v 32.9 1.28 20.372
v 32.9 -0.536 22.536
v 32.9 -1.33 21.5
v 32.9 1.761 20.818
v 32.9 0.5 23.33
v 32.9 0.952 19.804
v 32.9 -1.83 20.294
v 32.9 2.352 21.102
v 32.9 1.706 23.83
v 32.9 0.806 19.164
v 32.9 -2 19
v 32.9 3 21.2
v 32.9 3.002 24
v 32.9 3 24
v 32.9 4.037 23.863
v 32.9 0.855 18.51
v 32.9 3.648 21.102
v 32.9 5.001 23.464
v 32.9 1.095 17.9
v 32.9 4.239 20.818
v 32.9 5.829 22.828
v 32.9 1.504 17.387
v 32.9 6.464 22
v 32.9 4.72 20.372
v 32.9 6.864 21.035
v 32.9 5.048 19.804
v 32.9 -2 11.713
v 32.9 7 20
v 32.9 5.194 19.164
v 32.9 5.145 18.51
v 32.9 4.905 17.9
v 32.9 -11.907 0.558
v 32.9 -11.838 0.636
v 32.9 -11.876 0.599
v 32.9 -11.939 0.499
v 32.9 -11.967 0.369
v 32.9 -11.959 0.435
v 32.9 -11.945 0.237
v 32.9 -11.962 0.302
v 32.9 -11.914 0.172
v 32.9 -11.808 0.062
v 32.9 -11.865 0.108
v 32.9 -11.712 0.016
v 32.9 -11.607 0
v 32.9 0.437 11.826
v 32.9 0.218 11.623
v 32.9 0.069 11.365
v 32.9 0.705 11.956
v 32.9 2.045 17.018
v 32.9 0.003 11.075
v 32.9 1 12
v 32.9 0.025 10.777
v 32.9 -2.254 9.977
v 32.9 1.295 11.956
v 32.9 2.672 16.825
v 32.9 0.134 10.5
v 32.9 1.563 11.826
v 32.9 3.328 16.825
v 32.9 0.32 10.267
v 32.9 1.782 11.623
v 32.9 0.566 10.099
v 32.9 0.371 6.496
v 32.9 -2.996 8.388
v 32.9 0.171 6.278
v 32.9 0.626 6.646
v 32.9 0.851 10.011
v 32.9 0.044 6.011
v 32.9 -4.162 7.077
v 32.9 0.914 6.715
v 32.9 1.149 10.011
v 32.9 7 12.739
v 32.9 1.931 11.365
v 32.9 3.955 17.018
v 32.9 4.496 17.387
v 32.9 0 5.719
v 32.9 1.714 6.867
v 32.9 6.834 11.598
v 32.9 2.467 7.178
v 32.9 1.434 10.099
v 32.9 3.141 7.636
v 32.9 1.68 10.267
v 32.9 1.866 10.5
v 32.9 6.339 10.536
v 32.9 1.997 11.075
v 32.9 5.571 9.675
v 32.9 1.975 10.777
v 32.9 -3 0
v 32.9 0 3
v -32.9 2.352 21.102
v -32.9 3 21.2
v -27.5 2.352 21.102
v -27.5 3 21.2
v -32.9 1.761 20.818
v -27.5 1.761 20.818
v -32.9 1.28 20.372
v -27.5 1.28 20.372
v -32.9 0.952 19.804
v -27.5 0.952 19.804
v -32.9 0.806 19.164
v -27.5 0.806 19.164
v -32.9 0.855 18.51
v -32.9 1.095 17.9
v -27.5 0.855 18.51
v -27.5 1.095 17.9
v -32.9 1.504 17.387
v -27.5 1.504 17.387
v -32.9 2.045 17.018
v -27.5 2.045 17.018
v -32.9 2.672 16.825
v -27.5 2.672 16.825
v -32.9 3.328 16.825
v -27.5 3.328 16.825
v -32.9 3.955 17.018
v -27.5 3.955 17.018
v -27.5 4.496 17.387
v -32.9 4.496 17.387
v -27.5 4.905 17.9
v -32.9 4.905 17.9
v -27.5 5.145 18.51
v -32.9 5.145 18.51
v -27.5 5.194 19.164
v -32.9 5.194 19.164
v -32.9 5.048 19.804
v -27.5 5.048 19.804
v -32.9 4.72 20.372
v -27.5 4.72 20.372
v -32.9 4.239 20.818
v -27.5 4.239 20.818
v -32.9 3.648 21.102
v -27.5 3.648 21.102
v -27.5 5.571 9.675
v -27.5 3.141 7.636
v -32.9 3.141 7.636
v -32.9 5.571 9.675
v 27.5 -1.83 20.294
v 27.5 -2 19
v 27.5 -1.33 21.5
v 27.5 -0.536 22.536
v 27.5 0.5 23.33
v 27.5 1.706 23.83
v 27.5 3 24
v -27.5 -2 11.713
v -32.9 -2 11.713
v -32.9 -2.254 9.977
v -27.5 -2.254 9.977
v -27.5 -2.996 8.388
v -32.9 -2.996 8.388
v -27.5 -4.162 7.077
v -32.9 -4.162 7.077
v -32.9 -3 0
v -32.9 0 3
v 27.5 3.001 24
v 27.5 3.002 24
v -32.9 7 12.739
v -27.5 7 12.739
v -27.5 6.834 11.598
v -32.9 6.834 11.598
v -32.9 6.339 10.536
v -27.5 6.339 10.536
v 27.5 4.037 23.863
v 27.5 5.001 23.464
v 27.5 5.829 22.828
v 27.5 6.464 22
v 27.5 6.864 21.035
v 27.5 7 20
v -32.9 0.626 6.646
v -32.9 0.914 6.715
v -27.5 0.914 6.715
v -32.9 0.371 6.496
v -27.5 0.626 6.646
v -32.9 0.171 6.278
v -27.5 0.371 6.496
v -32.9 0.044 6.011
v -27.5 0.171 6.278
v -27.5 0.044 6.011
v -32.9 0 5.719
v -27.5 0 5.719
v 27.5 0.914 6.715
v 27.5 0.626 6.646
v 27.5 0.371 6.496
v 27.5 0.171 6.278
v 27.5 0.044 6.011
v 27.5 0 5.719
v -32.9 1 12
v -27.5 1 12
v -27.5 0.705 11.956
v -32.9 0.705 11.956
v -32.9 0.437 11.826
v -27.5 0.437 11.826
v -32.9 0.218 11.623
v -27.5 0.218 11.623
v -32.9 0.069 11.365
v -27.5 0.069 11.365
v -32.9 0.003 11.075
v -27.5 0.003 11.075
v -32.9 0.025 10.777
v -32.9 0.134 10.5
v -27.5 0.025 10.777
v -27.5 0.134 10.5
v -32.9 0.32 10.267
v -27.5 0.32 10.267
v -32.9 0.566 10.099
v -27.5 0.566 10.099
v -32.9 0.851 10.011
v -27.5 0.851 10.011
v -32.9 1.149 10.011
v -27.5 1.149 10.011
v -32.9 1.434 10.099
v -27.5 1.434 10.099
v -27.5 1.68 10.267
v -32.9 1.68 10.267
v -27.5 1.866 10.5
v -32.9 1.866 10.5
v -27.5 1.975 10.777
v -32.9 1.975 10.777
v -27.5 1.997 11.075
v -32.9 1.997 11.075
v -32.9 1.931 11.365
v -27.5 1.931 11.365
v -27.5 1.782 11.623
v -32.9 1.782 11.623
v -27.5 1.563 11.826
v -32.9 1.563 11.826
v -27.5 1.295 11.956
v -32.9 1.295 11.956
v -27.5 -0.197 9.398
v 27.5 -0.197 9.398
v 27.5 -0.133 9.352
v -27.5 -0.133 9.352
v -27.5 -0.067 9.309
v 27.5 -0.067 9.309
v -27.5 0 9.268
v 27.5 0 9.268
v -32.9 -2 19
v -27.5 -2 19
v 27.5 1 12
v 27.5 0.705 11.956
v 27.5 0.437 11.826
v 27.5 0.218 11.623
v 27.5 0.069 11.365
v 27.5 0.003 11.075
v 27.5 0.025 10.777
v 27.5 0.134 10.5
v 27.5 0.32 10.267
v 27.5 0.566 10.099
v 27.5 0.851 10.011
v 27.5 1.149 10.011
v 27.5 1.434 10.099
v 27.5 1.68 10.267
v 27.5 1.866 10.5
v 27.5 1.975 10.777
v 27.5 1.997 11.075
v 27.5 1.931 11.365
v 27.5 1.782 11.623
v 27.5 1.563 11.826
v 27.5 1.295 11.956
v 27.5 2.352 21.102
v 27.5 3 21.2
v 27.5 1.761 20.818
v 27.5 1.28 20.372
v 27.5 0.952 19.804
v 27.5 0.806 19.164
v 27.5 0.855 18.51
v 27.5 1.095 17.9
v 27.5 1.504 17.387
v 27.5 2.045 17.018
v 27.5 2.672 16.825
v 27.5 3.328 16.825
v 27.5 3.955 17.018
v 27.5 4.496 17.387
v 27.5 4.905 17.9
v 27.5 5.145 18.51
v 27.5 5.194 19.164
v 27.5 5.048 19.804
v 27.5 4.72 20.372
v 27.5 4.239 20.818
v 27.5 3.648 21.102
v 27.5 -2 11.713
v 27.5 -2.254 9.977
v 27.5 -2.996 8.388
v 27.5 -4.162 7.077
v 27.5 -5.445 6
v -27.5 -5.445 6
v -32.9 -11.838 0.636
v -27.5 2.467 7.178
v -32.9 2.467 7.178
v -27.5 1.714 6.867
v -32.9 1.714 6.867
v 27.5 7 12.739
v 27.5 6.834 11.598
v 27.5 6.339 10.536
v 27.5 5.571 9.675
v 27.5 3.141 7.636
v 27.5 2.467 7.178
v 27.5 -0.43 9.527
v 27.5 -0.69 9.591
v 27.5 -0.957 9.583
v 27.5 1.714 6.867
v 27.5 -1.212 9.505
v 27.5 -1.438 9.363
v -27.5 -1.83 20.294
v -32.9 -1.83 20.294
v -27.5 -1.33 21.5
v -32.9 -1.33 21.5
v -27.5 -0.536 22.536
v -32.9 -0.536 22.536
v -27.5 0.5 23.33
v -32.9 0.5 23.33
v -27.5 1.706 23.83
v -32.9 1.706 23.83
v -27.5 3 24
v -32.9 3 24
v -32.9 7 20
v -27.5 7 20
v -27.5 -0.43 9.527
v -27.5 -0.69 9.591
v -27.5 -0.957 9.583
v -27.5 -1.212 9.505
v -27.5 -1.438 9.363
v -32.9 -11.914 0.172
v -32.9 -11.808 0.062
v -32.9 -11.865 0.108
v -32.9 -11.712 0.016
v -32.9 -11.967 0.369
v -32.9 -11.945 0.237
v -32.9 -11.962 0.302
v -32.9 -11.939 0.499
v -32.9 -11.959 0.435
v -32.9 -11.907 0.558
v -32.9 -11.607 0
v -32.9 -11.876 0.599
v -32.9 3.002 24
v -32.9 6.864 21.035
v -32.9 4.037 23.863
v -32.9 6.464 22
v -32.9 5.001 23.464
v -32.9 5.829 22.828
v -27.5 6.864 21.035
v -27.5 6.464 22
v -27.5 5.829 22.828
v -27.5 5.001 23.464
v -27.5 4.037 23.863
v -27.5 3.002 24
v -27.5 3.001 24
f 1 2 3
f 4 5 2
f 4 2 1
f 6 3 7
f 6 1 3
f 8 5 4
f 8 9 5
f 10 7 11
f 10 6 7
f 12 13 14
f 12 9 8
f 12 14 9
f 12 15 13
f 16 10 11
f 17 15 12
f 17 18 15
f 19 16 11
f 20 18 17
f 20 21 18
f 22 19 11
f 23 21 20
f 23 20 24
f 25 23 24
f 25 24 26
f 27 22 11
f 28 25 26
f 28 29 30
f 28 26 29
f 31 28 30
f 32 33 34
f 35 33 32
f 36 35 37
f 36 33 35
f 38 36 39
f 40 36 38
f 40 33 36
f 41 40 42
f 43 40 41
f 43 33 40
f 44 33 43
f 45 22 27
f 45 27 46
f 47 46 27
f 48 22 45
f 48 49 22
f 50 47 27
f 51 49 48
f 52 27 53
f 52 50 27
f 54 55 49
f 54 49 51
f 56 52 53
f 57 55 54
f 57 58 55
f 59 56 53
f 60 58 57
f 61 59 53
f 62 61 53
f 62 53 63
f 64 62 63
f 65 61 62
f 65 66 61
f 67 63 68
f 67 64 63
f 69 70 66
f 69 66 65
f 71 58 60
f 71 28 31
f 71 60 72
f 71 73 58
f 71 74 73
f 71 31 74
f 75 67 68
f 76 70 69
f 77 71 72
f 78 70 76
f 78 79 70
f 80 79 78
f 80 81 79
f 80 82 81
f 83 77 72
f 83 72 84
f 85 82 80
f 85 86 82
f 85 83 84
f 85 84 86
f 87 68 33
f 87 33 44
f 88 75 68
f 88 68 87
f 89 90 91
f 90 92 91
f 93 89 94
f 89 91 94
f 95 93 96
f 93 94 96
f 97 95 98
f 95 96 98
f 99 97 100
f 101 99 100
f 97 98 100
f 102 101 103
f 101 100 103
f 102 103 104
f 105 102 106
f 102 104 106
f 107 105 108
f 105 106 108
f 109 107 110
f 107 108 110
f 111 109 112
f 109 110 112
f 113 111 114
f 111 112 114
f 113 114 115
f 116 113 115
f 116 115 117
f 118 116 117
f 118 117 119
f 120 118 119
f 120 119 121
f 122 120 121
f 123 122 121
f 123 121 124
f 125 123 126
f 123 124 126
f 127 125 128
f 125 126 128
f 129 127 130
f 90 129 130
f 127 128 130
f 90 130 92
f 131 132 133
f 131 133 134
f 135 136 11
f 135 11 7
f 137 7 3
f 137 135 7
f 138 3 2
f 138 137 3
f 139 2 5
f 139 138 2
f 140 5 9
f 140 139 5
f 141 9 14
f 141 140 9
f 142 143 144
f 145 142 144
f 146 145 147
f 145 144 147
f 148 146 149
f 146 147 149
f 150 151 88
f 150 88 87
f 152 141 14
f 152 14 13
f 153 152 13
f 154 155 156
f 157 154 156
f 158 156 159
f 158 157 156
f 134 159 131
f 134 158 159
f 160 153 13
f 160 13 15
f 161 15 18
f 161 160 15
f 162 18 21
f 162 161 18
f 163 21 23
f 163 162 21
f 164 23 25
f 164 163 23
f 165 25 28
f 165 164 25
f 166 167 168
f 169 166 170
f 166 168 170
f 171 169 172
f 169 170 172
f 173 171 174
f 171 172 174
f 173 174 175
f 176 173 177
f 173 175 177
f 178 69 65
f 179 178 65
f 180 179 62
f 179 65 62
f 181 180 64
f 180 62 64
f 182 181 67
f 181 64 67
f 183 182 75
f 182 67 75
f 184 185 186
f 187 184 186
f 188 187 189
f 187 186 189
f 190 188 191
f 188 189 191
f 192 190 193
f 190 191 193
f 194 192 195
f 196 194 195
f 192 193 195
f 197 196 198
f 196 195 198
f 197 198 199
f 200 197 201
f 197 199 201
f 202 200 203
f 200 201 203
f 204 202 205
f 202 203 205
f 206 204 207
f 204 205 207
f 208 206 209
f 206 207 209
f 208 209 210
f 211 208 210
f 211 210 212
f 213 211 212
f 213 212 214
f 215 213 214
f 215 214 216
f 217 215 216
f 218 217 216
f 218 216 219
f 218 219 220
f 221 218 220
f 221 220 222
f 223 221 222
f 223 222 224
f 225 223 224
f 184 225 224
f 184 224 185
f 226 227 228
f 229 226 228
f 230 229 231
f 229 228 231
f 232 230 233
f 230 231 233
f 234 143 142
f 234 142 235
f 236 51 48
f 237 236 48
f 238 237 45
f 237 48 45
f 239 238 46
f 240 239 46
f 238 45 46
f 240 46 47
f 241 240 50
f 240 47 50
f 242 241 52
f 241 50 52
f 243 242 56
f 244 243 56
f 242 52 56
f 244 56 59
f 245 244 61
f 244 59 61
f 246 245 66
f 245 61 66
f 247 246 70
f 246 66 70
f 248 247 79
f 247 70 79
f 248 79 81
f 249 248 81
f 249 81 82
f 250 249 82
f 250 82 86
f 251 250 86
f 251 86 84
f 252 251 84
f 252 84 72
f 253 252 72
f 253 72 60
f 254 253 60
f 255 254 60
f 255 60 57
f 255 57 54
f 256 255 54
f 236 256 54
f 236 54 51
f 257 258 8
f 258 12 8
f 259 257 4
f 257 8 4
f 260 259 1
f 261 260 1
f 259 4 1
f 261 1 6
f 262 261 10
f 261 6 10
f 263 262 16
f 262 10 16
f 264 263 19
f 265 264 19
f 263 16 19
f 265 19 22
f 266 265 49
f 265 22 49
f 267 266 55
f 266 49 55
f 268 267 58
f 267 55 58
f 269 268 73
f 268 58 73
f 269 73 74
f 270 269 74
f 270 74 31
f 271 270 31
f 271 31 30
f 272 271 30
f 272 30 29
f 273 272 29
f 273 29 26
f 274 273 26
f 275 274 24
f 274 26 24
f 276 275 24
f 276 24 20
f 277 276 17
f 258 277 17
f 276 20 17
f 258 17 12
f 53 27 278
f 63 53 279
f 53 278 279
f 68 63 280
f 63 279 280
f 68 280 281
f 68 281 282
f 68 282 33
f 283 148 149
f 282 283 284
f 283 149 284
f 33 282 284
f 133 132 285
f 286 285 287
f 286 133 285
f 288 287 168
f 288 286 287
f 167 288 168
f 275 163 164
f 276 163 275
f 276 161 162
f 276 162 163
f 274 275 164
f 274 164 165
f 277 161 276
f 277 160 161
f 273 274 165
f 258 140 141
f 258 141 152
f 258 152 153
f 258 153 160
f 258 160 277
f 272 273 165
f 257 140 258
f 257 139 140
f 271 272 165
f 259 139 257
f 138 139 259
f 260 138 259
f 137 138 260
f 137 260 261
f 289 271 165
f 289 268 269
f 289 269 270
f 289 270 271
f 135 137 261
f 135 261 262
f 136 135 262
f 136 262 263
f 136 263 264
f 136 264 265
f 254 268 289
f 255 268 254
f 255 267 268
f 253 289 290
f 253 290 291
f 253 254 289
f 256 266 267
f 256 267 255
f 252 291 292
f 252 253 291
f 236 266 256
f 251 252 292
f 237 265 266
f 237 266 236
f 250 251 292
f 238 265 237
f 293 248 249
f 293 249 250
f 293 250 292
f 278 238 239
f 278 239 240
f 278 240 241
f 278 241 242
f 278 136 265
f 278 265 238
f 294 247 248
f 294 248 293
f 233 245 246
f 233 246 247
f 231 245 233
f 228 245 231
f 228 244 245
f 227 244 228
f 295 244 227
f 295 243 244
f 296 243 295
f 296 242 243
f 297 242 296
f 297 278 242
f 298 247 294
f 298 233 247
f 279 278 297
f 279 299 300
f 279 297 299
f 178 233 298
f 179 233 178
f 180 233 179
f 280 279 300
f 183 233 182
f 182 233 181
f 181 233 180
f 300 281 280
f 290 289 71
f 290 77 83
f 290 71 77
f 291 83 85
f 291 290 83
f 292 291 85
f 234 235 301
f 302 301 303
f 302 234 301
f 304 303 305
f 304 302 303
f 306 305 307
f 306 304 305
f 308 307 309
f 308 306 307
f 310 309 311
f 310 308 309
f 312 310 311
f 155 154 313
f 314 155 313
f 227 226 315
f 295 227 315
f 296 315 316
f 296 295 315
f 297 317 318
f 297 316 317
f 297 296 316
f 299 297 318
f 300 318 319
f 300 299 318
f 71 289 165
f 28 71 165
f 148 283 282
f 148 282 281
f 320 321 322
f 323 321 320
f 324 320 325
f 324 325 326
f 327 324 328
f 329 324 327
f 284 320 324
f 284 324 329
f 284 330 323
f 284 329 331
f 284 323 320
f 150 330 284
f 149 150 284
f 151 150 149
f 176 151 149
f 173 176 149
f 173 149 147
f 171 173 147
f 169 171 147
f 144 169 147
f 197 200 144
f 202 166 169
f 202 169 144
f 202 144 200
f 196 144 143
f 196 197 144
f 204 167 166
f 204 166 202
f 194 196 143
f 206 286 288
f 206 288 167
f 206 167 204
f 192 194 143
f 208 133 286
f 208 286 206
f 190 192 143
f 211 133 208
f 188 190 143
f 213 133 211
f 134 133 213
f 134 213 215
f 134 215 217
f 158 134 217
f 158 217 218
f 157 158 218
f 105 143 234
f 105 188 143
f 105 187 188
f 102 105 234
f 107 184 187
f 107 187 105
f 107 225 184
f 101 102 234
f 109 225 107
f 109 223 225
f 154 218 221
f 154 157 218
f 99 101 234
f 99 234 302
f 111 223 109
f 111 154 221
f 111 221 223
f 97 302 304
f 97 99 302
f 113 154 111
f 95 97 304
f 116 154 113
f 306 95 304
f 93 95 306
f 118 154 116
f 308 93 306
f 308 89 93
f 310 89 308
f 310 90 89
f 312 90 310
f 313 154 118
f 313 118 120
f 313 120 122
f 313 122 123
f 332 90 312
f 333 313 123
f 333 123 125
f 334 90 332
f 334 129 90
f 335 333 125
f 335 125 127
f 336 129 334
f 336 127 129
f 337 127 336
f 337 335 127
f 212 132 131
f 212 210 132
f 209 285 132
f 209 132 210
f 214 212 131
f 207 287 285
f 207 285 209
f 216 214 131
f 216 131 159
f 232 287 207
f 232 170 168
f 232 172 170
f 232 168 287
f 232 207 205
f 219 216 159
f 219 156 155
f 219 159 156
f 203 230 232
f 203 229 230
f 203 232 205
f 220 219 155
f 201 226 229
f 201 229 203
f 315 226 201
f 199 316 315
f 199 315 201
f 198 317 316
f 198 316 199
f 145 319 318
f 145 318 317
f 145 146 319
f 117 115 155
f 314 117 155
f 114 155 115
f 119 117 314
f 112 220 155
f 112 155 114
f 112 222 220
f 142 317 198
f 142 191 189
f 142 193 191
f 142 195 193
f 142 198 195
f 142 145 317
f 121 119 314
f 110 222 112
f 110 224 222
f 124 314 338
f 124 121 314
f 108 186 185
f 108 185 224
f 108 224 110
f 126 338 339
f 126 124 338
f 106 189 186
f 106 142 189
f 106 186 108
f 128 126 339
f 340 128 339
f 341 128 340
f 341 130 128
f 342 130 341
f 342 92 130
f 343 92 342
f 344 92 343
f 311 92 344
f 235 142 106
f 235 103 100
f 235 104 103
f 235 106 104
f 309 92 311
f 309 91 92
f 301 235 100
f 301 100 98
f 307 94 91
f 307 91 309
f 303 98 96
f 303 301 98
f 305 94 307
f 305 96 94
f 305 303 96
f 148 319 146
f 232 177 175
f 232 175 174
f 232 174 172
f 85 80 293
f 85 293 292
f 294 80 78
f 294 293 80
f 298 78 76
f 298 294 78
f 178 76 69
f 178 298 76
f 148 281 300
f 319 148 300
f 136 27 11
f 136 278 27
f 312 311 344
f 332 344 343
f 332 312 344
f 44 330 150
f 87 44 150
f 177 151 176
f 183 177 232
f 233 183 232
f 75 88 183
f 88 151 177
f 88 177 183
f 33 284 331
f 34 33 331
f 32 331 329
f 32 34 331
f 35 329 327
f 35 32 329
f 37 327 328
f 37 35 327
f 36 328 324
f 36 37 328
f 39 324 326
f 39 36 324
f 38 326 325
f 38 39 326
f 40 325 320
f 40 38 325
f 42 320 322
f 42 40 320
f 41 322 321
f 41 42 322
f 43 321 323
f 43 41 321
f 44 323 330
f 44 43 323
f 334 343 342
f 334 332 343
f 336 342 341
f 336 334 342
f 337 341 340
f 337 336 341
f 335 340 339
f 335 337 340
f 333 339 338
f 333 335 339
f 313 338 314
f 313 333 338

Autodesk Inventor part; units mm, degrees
ref_plane "YZ Plane" through (0, 0, 0) normal (1, 0, 0) x (0, 1, 0)
ref_plane "XZ Plane" through (0, 0, 0) normal (0, 1, 0) x (-1, 0, 0)
ref_plane "XY Plane" through (0, 0, 0) normal (0, 0, 1) x (1, 0, 0)
sketch "Skizze1" plane through (0, 0, 0) normal (1, 0, 0) x (0, 1, 0)
  line L0 (-4.1616, 7.0772) -> (-12, 0.5)
  line L1 (-12, 0) -> (-3, 0)
  line L2 (-12, 0.5) -> (-12, 0)
  line L3 (0, 5) -> (8, 11.7128)
  circle A0 centre (3, 19) radius 0.5
  line L4 (-2, 11.7128) -> (-2, 24)
  line L5 (-2, 24) -> (8, 24)
  line L6 (8, 24) -> (8, 11.7128)
  line L7 (0, 3) -> (-3, 0)
  line L8 (8, 11.7128) -> (-2, 11.7128) construction
  arc A1 (-4.1616, 7.0772) -> (-2, 11.7128) centre (-8.0514, 11.7128) ccw
  line L9 (0, 5) -> (0, 3)
  line L10 (3, 19) -> (3, 0) construction
  point P0 (0, 0)
  dimension "d40" = 0.5
  dimension "d44" = 1
  dimension "d59" = 10
  dimension "d60" = 45
  dimension "d61" = 5
  dimension "d63" = 40
  dimension "d78" = 3
  dimension "d79" = 12
  dimension "d80" = 0
  dimension "d81" = 19
  dimension "d82" = 5
  dimension "d83" = 3
extrude "Extrusion1" add sketch "Skizze1" along normal mid plane 67
sketch "Skizze6" plane through (0, 0, 0) normal (0, 1, 0) x (-1, 0, 0)
  line L0 (33.5, 0.5) -> (-33.5, 0.5) projected
  line L1 (-33.5, 7.0772) -> (-33.5, 0.5) projected
  line L2 (33.5, 0.5) -> (33.5, 7.0772) projected
  line L3 (-27.5, 6) -> (27.5, 6)
  line L4 (27.5, 6) -> (27.5, 31)
  line L5 (27.5, 31) -> (-27.5, 31)
  line L6 (-27.5, 31) -> (-27.5, 6)
  line L7 (0, -6.2) -> (0, 37.2) projected
  line L8 (33.5, 0) -> (-33.5, 0) projected
  line L9 (-33.5, 0) -> (33.5, 0) projected
  point P0 (0, 0)
  point P1 (-33, 10)
  point P2 (33, 10)
  dimension "d45" = 6
  dimension "d46" = 25
  dimension "d50" = 6
extrude "Extrusion4" cut sketch "Skizze6" along normal mid plane 16
sketch "Skizze3" plane through (-33.5, 0, 0) normal (-1, 0, 0) x (0, 0, 1)
  line L0 (0, -3) -> (0, -12) projected
  line L1 (0.5, -12) -> (7.0772, -4.1616) projected
  line L2 (0, -12) -> (0, 0) construction
  line L3 (0, 12) -> (0, -16) projected
  line L4 (0, -12) -> (0.5, -12) projected
  line L5 (11.7128, 8) -> (5, 0) projected
  line L6 (11.7128, -2) -> (24, -2) projected
  line L7 (24, -2) -> (24, 8) projected
  line L8 (24, 8) -> (11.7128, 8) projected
  circle A0 centre (19, 3) radius 0.5 projected
  line L9 (3, 0) -> (0, -3) projected
  arc A1 (11.7128, -2) -> (7.0772, -4.1616) centre (11.7128, -8.0514) ccw projected
  line L10 (5, 0) -> (3, 0) projected
hole "Bohrung1" at (-33.5, 3, 19) direction (1, 0, 0) diameter 4.4 end through all
sketch "Skizze4" plane through (-33.5, 0, 0) normal (-1, 0, 0) x (0, 0, 1)
  line L0 (0, 12) -> (0, -16) projected
  line L1 (-5.8, 0) -> (34.8, 0) projected
  point P0 (29, 0)
  point P1 (11, 1)
  dimension "d38" = 11
  dimension "d84" = 1
hole "Bohrung2" at (-33.5, 1, 11) direction (1, 0, 0) diameter 2 end through all
fillet "Rundung2" radius 5 6 edges at (30.5, -2, 24) (30.5, 8, 24) (-30.5, 8, 24) (-30.5, -2, 24) (30.5, 8, 11.7128) (-30.5, 8, 11.7128)
fillet "Rundung8" radius 0.36 2 edges at (0, -12, 0.5) (0, -12, 0)
sketch "Skizze7" plane through (-27.5, 1.1918, 6) normal (0, 0, 1) x (1, 0, 0)
  line L0 (0, 0) -> (55, 0) projected
  line L1 (0, 0) -> (0, -6.6371) projected
  line L2 (55, -6.6371) -> (0, -6.6371) projected
  line L3 (55, -6.6371) -> (55, 0) projected
  line L4 (-19.4, -1.1918) -> (74.4, -1.1918) projected
  point P0 (27.5, -1.1918)
  point P1 (0, -1.1918)
  point P2 (55, -1.1918)
extrude "Extrusion5" cut sketch "Skizze7" against normal through all contours L0 L3 L4 L1
sketch "Skizze8" plane through (-27.5, -5.4454, 6) normal (1, 0, 0) x (0, 0, -1)
  line L0 (-8.0443, 13.4454) -> (-13, 13.4454) projected
  line L1 (-10.5222, 13.4454) -> (-10.5222, 12.4454)
  line L2 (-10.5222, 12.4454) -> (-17.4656, 12.4454)
  line L3 (-17.4656, 12.4454) -> (-4.9838, 12.4454)
  line L4 (-4.9838, 12.4454) -> (-4.9838, 14.4351)
  line L5 (-4.9838, 14.4351) -> (-17.4656, 14.4351)
  line L6 (-17.4656, 14.4351) -> (-17.4656, 12.4454)
  point P0 (6, 5.4454)
  dimension "d90" = 1
extrude "Extrusion6" cut sketch "Skizze8" along normal mid plane 200
fillet "Rundung10" radius 4 4 edges at (30.5, 7, 11.0443) (30.5, 7, 22.0001) (-30.5, 7, 22.0001) (-30.5, 7, 11.0443)
sketch "Skizze9" plane through (-27.5, -2, 19) normal (1, 0, 0) x (0, 0, -1)
  line L0 (9.3252, 7.5712) -> (14, 2) projected
  line L1 (14, 2) -> (14, 3)
  line L2 (14, 3) -> (12.8, 3)
  line L3 (12.8, 3) -> (14, 3)
  line L4 (14, 3) -> (14, 4.2192)
  line L5 (14, 4.2192) -> (12.8, 4.2192)
  line L6 (12.8, 4.2192) -> (12.8, 3)
  line L7 (12.3, 4.7192) -> (14.5, 4.7192)
  line L8 (14.5, 4.7192) -> (14.5, 2.5)
  line L9 (14.5, 2.5) -> (12.3, 2.5)
  line L10 (12.3, 2.5) -> (12.3, 4.7192)
  line L11 (12.3, 2.5) -> (12.3, 1.2569)
  line L12 (12.3, 1.2569) -> (14.6235, 1.2569)
  line L13 (12.3, 1.2569) -> (11.55, 1.2569)
  line L14 (11.55, 1.2569) -> (11.55, 4.7192)
  line L15 (11.55, 4.7192) -> (12.3, 4.7192)
  point P0 (19, 2)
  point P1 (13.5805, 2.5)
  point P2 (12.3, 4.026)
  point P3 (11.55, 4.45)
  point P4 (13.1609, 3)
  point P5 (14, 2.5)
  dimension "d95" = 1
  dimension "d96" = 1.2
  dimension "d97" = 0.5
  dimension "d103" = 0.75
extrude "Extrusion7" cut sketch "Skizze9" along normal mid plane 200 contours L10 L7 L8 L9 L1 L4 L5 L6 L0 | L0 L6 L2 L9 L10 | L6 L5 L4 L2 L0 | L0 L2 L6 | L2 L1 L9 L0 | L9 L1 L0
fillet "Rundung12" radius 4 2 edges at (30.5, 2.026, 6.7) (-30.5, 2.026, 6.7)
sketch "Skizze16" plane through (-27.5, 0, 6) normal (0, 0, 1) x (1, 0, 0)
  line L0 (27.5, 0) -> (27.5, -5.4454)
  line L1 (55, -5.4454) -> (0, -5.4454) projected
  line L2 (27.5, -5.4454) -> (27.5, -26.9454)
  circle A0 centre (27.5, -26.9454) radius 21.5
  circle A1 centre (27.5, -26.9454) radius 24.5
  line L3 (0, -5.4454) -> (0, 0)
  line L4 (-6, 0) -> (61, 0) projected
  line L5 (0, 0) -> (55, 0)
  line L6 (55, 0) -> (55, -5.4454)
  line L7 (55, -5.4454) -> (0, -5.4454)
  line L8 (0, -5.4454) -> (0, 0)
  point P0 (15.7527, -5.4454)
  point P1 (39.2473, -5.4454)
  point P2 (55, 0)
  dimension "d122" = 21.5
  dimension "d123" = 3
extrude "Extrusion11" add sketch "Skizze16" along normal blind 5 contours L4 L6 L1 A1 L0 | L0 A1 L1 L3 L4 | A1 L1 L0 | L0 L1 A1
sketch "Skizze18" plane through (27.5, -5.4454, 11) normal (1, 0, 0) x (0, 0, -1)
  line L0 (10.3642, -6.3928) -> (3.9228, 1.2837) projected
  line L1 (10.3642, -6.3928) -> (0, 5.9588)
  line L2 (0, 0) -> (0, 3.4032) projected
  line L3 (0, 5.9588) -> (0, 0)
  line L4 (0, 0) -> (5, 0)
  point P0 (11, 5.4454)
  point P1 (5, 0)
extrude "Extrusion12" cut sketch "Skizze18" against normal up to surface (55 mm away)
sketch "Skizze19" plane through (27.5, -2, 11.7128) normal (-1, 0, 0) x (0, 0, 1)
  circle A0 centre (-0.7128, 3) radius 1 projected
  circle A1 centre (-0.7128, 3) radius 2
  point P0 (-11.7128, 2)
  dimension "d131" = 4
extrude "Extrusion13" cut sketch "Skizze19" along normal up to surface (55 mm away) contours A0 | A1
sketch "Skizze22" plane through (33.5, 0, 0) normal (1, 0, 0) x (0, 0, -1)
  line L0 (0, -3) -> (-3, 0) projected
  line L1 (-5.4195, 0.5) -> (-6.7, 0.5) projected
  line L2 (-3, 0) -> (-6.7, 0)
  line L3 (-6.7, 0) -> (-6.7, 0.5)
  line L4 (-6.7, 0.5) -> (-3, 0.5)
  line L5 (-3, 0.5) -> (-3, 0)
  point P0 (0, 0)
  point P1 (-5.4195, 0.5)
extrude "Extrusion14" cut sketch "Skizze22" against normal up to surface (67 mm away)
fillet "Rundung22" radius 1 2 edges at (30.5, 0, 6.7) (-30.5, 0, 6.7)
sketch "Skizze23" plane through (-33.5, -2, 11.7128) normal (0, -1, 0) x (1, 0, 0)
  line L0 (0, 8.2872) -> (0, 12.2872) projected
  line L1 (0, 12.2872) -> (67, 12.2872)
  line L2 (67, 12.2872) -> (67, -11.7128)
  line L3 (67, -11.7128) -> (0, -11.7128)
  line L4 (0, -11.7128) -> (0, 12.2872)
  line L5 (66.4, 11.6872) -> (0.6, 11.6872)
  line L6 (0.6, 11.6872) -> (0.6, -11.1128)
  line L7 (0.6, -11.1128) -> (66.4, -11.1128)
  line L8 (66.4, -11.1128) -> (66.4, 11.6872)
  line L9 (66.4, 11.6872) -> (66.4, 12.2872)
  line L10 (66.4, -11.1128) -> (66.4, -11.7128)
  line L11 (0.6, -11.1128) -> (0.6, -11.7128)
  line L12 (0.6, 11.6872) -> (0.6, 12.2872)
  dimension "d146" = 0.6
extrude "Extrusion15" cut sketch "Skizze23" along normal mid plane 100 contours L0 L1 L12 L6 L11 L3 L4 | L1 L2 L3 L10 L8 L9
fillet "Rundung23" radius 1 1 edges at (0, -0.7143, 9.9698)
properties part number "Schaufel" material "Aluminium 6061"
